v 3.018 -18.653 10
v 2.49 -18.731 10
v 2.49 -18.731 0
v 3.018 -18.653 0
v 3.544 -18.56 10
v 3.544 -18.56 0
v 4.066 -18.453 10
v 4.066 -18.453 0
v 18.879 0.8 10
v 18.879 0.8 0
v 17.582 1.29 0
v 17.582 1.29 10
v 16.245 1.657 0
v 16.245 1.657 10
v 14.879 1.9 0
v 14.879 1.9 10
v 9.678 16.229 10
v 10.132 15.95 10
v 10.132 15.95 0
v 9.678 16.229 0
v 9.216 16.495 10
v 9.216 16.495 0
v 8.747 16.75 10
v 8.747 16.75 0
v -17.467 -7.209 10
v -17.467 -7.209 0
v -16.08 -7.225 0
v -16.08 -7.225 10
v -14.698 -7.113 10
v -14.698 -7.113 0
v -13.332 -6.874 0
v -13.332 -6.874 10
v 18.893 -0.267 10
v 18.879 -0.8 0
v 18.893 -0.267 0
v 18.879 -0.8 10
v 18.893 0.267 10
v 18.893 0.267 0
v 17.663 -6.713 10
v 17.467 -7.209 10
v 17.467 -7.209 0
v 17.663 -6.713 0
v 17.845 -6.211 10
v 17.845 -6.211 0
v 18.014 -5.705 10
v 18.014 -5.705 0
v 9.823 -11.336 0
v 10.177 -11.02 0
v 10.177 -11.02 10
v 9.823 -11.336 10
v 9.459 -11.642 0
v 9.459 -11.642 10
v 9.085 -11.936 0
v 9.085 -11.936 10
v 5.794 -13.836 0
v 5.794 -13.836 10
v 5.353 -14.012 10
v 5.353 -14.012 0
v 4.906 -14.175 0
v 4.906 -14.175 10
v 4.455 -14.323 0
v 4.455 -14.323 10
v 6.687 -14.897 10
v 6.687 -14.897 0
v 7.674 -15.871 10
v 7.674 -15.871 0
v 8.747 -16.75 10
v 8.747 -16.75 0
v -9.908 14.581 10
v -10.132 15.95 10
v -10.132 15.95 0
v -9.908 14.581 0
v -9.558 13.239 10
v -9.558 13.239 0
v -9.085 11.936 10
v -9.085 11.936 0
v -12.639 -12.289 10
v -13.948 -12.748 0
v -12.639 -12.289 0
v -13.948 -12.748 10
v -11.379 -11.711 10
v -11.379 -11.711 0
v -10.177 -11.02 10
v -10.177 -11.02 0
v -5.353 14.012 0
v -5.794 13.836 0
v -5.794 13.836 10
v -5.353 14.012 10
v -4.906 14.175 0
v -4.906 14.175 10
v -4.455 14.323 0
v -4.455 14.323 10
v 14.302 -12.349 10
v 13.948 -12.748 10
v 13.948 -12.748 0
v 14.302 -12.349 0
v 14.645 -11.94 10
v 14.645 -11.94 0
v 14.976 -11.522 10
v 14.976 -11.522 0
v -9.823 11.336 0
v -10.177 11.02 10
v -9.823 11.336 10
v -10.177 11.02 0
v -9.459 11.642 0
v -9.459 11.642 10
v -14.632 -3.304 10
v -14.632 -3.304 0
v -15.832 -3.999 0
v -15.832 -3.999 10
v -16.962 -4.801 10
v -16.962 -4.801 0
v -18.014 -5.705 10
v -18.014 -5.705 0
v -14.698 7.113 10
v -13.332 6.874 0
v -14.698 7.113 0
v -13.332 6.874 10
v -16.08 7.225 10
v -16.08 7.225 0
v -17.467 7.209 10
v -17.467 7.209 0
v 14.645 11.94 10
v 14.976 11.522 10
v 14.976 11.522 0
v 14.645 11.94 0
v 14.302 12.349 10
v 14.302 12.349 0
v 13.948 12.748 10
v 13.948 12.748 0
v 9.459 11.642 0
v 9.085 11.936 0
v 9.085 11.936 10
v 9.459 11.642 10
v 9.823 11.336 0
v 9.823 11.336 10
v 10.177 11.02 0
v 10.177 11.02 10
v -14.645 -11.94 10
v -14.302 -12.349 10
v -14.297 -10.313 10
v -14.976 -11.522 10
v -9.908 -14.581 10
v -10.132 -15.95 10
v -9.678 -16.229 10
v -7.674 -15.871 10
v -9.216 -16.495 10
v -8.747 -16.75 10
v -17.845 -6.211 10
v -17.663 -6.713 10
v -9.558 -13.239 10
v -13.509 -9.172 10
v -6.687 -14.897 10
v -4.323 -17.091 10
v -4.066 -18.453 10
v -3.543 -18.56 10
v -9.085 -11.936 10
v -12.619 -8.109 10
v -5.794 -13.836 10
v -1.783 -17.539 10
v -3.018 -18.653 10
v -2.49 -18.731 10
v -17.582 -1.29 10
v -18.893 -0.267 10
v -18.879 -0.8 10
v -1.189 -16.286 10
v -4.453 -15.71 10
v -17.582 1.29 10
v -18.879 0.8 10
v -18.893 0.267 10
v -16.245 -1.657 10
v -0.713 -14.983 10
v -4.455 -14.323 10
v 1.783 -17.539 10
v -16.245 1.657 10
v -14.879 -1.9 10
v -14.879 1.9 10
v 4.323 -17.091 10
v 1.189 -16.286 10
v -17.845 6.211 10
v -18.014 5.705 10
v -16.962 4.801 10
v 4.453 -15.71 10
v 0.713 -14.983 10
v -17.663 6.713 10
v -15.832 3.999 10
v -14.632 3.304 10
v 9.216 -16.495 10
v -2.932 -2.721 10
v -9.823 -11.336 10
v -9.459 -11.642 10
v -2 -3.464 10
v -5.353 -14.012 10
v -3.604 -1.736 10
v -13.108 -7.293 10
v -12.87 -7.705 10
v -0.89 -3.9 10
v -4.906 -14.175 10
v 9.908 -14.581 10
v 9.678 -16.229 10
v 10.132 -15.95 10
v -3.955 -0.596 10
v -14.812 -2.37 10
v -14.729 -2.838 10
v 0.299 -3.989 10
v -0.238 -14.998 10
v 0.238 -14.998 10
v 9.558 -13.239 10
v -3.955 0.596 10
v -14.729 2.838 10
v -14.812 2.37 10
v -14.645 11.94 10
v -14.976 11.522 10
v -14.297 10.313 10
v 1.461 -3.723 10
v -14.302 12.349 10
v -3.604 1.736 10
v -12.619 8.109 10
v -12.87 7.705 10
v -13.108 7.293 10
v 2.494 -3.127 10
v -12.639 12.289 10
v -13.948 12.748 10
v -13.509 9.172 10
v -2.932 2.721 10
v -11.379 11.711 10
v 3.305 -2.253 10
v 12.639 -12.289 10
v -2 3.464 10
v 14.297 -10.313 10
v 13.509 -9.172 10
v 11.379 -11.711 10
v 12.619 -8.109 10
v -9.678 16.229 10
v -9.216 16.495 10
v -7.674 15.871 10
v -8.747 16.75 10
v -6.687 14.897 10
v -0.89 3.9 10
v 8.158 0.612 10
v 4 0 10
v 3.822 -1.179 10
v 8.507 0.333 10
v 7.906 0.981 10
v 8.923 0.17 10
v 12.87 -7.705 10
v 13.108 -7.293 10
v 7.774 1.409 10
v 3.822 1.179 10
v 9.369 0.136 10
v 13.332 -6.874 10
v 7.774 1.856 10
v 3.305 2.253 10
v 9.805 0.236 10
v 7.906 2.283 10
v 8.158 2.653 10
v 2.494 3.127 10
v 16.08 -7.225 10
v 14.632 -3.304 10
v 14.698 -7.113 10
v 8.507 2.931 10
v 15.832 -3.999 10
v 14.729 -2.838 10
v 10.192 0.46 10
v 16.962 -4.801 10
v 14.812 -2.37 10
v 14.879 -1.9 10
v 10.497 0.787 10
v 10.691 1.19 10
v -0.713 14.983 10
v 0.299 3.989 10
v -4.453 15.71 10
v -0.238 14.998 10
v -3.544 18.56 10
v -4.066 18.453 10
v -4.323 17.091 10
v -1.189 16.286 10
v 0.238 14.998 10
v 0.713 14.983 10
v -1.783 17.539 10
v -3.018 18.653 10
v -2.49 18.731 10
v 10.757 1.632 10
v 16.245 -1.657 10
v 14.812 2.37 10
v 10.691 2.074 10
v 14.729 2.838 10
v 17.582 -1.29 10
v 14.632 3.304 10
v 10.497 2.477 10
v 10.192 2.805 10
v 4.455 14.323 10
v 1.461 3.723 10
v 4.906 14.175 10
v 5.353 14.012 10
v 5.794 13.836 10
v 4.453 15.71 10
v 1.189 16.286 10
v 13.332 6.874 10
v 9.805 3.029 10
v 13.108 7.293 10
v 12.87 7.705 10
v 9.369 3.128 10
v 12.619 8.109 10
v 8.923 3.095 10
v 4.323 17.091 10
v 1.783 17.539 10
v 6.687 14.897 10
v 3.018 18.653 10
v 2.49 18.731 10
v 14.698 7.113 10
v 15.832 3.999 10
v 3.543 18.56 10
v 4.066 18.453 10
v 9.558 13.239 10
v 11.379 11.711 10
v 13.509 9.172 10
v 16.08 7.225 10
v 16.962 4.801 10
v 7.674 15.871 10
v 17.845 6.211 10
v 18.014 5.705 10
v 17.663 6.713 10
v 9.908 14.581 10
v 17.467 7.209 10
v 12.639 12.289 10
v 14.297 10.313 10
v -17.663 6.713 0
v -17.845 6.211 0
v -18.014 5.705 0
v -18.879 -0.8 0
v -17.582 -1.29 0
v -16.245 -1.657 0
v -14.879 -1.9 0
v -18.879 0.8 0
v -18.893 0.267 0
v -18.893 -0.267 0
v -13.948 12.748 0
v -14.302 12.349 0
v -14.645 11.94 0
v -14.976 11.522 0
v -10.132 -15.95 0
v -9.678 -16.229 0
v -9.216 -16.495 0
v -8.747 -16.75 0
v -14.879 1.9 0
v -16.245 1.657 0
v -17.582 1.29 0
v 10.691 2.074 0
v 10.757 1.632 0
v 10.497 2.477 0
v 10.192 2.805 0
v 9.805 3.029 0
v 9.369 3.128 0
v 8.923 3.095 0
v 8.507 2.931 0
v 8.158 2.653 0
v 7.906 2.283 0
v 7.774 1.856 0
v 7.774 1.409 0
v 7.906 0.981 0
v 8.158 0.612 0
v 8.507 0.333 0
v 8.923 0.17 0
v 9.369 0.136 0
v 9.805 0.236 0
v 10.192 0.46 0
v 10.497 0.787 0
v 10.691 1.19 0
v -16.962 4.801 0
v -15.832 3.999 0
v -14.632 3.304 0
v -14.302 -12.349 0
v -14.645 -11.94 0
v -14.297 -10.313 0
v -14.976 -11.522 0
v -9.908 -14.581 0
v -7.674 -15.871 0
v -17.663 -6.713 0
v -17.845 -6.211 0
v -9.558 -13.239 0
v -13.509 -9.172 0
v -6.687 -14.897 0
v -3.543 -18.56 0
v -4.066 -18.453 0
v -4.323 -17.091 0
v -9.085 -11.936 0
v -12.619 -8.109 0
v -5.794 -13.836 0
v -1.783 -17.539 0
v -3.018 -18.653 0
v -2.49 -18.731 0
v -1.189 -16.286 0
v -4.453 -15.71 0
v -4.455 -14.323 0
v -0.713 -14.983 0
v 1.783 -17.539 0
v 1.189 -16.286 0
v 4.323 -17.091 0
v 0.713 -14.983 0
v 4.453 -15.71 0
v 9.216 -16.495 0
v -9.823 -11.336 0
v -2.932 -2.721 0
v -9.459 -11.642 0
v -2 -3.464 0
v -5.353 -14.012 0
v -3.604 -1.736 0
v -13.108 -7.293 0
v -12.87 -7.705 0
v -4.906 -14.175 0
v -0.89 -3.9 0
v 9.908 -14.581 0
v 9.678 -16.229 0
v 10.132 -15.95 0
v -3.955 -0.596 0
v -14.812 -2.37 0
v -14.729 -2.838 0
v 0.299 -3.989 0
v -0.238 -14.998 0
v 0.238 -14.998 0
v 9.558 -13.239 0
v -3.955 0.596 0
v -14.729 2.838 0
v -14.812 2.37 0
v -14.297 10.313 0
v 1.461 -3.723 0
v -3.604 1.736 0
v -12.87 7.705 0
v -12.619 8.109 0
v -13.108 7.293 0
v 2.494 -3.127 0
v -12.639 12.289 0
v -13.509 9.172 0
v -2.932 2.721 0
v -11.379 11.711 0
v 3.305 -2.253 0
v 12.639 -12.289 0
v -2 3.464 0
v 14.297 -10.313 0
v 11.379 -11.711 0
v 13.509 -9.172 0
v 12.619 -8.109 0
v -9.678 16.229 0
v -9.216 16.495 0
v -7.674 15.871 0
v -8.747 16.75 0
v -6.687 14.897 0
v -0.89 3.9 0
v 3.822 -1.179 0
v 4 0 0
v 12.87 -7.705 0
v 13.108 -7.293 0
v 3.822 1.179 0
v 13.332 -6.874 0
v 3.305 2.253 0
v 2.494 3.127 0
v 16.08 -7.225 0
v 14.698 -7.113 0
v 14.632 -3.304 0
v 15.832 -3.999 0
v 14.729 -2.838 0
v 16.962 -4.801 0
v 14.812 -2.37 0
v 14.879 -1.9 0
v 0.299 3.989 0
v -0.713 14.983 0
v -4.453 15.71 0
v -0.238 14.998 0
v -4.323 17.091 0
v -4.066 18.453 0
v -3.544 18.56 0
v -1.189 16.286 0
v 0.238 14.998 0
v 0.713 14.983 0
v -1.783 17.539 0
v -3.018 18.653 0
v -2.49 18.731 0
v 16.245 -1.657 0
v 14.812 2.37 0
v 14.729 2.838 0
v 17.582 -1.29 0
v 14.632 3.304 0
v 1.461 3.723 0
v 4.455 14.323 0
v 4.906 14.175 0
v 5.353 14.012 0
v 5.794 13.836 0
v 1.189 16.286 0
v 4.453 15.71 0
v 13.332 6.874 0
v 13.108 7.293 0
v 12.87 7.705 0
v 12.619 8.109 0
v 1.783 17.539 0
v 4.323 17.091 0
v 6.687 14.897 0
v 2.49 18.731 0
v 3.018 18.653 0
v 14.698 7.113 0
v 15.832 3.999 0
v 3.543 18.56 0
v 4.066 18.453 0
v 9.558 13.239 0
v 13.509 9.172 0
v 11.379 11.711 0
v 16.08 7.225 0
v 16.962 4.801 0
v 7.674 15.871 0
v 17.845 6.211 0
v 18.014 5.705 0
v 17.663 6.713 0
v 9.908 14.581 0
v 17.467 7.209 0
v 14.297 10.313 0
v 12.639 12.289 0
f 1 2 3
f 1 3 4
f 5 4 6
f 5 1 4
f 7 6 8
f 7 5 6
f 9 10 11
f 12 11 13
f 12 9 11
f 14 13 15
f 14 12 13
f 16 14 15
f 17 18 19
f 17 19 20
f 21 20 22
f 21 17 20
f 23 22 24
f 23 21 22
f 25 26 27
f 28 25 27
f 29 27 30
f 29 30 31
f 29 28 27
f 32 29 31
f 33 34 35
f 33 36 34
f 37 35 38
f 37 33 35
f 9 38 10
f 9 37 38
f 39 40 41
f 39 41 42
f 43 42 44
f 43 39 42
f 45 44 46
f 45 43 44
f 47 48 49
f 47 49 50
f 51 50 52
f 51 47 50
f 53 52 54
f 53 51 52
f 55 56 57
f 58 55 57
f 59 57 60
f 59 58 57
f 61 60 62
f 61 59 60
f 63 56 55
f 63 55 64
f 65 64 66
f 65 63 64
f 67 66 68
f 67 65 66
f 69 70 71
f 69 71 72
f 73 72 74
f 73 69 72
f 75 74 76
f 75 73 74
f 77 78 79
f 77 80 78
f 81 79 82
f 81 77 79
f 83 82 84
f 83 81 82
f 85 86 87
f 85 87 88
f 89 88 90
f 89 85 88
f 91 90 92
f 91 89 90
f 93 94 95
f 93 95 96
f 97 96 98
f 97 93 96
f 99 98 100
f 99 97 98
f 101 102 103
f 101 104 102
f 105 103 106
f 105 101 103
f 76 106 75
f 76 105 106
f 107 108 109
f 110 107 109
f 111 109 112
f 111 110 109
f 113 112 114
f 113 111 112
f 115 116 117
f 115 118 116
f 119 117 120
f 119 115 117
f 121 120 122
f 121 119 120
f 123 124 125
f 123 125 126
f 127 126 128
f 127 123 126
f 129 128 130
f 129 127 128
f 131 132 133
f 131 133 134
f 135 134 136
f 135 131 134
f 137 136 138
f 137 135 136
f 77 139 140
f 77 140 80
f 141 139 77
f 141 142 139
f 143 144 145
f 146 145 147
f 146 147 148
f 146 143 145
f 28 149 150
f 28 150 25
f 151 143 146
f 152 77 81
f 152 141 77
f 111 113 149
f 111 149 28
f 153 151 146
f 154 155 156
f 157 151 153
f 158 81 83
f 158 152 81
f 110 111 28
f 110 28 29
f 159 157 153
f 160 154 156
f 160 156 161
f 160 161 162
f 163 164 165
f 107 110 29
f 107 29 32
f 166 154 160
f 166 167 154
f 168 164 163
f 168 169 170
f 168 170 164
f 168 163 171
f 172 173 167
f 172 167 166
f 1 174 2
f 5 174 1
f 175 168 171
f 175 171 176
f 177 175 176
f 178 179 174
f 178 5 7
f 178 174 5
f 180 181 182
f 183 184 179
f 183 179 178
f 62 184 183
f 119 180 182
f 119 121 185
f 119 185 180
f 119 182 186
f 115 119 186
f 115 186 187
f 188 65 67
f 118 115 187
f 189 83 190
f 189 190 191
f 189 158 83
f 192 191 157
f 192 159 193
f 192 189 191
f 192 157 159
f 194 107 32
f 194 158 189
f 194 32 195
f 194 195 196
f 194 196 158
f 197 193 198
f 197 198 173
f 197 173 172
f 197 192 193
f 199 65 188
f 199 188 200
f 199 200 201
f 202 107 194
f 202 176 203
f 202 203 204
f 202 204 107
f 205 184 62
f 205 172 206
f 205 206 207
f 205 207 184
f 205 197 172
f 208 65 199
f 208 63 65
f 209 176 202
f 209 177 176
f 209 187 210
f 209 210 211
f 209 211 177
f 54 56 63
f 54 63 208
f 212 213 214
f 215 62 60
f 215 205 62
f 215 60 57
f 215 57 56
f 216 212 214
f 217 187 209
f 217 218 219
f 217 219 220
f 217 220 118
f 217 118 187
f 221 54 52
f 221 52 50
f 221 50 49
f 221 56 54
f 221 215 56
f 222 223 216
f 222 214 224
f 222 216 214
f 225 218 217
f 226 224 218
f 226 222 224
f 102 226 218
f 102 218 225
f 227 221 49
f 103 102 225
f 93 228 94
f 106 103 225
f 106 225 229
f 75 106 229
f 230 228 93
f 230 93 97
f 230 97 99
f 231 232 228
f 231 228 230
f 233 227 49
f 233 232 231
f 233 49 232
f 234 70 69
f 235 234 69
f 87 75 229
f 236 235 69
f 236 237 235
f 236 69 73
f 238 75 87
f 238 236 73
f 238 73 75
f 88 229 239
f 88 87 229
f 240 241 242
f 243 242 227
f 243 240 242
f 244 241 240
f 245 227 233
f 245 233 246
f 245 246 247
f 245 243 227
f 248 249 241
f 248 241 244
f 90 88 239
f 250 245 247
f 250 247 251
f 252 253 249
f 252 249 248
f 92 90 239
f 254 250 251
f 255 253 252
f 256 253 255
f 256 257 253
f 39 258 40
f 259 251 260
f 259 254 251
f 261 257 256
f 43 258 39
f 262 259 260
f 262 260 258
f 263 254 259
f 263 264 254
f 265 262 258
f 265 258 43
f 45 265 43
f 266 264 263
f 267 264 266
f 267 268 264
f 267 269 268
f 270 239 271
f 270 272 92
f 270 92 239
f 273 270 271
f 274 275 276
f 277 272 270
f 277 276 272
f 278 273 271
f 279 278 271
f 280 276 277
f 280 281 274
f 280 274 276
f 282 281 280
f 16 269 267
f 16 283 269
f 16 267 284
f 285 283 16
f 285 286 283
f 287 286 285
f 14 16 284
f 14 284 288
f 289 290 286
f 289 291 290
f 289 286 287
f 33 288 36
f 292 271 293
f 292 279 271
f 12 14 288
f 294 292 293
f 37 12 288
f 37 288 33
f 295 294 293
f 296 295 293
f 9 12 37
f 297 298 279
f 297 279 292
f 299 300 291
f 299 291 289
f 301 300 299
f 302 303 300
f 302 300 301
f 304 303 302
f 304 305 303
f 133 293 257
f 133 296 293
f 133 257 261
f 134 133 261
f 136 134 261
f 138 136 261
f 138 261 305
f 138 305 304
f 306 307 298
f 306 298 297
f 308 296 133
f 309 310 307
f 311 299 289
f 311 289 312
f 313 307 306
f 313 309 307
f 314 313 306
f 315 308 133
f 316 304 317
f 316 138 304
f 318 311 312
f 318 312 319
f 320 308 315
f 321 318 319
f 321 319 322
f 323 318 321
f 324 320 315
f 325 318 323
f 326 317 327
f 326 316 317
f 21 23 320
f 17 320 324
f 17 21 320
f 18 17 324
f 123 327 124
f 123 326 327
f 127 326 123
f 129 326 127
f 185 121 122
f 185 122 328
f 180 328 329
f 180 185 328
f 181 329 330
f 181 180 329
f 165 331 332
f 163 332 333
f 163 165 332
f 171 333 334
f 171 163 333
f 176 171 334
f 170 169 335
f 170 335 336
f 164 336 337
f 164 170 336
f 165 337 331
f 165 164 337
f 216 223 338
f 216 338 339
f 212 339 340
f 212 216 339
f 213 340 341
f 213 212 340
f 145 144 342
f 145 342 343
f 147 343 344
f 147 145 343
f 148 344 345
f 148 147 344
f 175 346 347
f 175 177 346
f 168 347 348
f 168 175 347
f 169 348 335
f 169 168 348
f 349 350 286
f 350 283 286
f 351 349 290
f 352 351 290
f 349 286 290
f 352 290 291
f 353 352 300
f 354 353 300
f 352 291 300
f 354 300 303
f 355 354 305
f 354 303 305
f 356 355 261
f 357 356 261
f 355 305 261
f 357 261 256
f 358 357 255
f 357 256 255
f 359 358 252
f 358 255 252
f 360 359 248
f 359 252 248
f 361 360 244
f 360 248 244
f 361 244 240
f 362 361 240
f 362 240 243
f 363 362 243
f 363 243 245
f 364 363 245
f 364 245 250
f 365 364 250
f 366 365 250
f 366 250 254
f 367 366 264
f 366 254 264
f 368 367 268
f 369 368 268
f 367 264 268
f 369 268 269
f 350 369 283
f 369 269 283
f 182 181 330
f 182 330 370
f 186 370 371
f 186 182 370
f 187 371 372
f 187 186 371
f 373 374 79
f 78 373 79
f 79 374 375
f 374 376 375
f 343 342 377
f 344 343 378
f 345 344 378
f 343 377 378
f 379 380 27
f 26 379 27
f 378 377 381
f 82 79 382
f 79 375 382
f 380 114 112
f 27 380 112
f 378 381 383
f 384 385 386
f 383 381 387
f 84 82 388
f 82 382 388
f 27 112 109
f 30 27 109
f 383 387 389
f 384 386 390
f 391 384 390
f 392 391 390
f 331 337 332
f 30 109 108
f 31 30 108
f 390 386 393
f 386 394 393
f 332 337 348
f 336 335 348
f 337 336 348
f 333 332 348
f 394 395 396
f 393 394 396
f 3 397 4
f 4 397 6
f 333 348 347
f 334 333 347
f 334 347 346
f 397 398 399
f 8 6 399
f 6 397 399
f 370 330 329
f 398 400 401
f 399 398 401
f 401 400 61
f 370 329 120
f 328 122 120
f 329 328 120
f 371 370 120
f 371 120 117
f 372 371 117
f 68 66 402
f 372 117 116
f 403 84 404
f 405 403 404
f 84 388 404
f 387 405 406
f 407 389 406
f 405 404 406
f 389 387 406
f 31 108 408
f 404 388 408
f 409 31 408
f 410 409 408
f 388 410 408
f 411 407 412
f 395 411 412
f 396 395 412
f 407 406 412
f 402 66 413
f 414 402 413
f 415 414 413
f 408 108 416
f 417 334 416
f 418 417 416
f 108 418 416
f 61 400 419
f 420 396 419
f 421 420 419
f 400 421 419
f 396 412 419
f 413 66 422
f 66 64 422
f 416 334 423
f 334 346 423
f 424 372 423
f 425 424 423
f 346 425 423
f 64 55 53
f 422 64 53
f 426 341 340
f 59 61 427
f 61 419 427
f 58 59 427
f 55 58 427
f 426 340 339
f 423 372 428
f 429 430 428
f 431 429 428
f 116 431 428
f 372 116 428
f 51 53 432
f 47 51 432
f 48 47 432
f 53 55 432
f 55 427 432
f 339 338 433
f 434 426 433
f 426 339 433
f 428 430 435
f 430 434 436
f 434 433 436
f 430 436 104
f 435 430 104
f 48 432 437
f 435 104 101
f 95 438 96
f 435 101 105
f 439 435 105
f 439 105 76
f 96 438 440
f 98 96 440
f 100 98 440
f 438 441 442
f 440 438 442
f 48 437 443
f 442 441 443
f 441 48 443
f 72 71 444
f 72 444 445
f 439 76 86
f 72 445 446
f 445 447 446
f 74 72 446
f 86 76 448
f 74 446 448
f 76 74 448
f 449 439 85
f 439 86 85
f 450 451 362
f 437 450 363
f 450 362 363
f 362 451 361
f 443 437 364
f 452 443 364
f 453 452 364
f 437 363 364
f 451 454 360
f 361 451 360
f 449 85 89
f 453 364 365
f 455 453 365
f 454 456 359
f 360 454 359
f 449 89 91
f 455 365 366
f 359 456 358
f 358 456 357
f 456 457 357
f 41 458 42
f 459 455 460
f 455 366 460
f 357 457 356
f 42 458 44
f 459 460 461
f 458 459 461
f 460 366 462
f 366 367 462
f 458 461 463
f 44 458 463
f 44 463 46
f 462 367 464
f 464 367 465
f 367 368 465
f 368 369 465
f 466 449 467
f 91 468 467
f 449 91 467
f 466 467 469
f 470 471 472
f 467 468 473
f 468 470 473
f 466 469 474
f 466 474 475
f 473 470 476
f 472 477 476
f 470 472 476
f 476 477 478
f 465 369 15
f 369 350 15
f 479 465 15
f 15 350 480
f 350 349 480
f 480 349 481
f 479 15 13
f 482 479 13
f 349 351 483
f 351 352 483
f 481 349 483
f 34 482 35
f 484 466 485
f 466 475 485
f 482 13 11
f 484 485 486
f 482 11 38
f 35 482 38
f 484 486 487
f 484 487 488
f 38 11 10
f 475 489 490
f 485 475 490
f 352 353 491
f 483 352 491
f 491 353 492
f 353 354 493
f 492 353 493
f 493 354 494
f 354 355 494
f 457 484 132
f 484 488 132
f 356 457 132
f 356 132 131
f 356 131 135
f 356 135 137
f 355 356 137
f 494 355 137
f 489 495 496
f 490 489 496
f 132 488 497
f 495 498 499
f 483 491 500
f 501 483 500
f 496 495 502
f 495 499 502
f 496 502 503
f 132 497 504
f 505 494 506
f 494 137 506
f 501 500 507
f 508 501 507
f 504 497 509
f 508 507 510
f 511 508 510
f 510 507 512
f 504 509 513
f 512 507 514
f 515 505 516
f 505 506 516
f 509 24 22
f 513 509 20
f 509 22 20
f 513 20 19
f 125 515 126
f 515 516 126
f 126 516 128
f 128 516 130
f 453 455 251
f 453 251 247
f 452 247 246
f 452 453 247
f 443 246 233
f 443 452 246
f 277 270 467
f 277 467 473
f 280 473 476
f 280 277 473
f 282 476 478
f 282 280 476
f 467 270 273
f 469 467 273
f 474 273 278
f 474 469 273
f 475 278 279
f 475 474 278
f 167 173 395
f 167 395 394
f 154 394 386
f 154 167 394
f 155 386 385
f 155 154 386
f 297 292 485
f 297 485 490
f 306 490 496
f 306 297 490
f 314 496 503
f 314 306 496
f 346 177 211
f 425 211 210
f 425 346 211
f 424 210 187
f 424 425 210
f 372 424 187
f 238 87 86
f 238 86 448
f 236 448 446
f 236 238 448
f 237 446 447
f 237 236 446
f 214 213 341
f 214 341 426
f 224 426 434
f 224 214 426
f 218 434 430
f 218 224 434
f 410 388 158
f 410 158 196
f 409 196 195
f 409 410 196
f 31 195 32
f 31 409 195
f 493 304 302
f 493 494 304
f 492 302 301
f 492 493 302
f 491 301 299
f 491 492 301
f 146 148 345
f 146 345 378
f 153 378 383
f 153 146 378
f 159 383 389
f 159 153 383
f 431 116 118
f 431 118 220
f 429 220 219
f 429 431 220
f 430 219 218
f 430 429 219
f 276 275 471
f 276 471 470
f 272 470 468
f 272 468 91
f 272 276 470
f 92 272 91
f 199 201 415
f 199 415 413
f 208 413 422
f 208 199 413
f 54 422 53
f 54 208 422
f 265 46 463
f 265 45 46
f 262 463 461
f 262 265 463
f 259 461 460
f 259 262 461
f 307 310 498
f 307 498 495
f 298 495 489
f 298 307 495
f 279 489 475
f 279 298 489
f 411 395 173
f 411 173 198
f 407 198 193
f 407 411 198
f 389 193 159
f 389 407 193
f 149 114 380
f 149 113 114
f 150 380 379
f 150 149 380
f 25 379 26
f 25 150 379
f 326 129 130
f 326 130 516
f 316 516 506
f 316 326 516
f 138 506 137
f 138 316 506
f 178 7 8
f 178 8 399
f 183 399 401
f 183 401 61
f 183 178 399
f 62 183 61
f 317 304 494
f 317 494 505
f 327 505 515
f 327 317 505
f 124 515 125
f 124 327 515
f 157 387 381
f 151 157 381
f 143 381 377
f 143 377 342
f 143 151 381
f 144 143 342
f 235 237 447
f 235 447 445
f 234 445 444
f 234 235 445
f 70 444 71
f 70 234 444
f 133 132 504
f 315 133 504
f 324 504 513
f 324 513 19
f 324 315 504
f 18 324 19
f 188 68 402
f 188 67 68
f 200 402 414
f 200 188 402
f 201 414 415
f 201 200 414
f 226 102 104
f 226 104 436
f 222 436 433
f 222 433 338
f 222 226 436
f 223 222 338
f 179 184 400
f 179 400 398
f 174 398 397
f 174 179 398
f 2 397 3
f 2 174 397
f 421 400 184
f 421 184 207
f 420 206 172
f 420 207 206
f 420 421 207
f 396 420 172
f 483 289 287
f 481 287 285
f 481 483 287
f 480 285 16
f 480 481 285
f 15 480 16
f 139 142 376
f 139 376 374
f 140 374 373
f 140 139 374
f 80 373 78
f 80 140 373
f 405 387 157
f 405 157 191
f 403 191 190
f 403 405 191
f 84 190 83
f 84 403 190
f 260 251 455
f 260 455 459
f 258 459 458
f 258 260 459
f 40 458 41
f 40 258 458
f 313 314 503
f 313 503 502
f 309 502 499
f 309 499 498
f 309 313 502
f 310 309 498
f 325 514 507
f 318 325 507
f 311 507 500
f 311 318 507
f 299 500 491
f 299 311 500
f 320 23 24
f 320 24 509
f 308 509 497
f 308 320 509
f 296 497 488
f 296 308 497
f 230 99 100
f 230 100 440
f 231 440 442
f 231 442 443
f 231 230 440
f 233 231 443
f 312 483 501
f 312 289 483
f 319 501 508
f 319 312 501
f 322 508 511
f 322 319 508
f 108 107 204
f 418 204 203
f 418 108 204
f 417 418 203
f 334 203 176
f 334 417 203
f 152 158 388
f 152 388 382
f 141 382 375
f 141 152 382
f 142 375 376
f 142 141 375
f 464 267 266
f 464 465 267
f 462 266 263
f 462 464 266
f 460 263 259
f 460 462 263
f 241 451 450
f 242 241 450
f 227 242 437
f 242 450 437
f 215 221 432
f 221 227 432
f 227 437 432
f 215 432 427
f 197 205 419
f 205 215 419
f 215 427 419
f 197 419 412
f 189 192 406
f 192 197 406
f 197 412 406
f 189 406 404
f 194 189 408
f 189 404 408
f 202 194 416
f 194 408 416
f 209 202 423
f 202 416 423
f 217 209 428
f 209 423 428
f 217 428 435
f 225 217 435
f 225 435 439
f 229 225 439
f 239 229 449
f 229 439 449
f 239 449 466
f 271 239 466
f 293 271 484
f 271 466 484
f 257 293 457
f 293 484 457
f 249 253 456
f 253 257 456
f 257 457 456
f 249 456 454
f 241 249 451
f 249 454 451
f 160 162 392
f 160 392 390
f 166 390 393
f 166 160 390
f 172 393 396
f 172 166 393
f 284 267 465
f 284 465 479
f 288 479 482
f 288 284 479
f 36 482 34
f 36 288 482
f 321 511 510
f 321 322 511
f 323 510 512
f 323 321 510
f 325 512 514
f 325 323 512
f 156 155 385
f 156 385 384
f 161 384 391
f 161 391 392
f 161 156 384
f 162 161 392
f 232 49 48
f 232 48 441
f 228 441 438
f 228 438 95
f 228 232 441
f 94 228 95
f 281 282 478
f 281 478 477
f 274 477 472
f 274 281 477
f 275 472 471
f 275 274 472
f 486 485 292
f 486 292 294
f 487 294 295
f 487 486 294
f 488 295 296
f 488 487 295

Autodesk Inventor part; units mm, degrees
ref_plane "YZ Plane" through (0, 0, 0) normal (1, 0, 0) x (0, 1, 0)
ref_plane "XZ Plane" through (0, 0, 0) normal (0, 1, 0) x (-1, 0, 0)
ref_plane "XY Plane" through (0, 0, 0) normal (0, 0, 1) x (1, 0, 0)
sketch "Sketch1" plane through (0, 0, 0) normal (0, 0, 1) x (1, 0, 0)
  circle A0 centre (0, 0) radius 15
  circle A1 centre (0, 0) radius 4
  dimension "d0" = 30
  dimension "d1" = 8
extrude "Extrusion1" add sketch "Sketch1" along normal blind 10
sketch "Sketch3" plane through (0, 0, 10) normal (0, 0, 1) x (1, 0, 0)
  line L0 (0, 0) -> (25, 0) construction
  arc A0 (18.8792, 0.8) -> (14.8792, 1.9) centre (12.94, -12.9741) ccw
  circle A1 centre (0, 0) radius 15 projected
  arc A2 (18.8792, -0.8) -> (18.8792, 0.8) centre (-1.1048, 0) ccw
  arc A3 (14.8792, -1.9) -> (18.8792, -0.8) centre (12.94, 12.9741) ccw
  arc A4 (14.8792, -1.9) -> (14.8792, 1.9) centre (0, 0) ccw
  arc A5 (17.467, 7.2088) -> (13.332, 6.8744) centre (16.5971, -7.7659) ccw
  arc A6 (18.0142, 5.7053) -> (17.467, 7.2088) centre (-1.0382, -0.3779) ccw
  arc A7 (14.6317, 3.3036) -> (18.0142, 5.7053) centre (7.7223, 16.6175) ccw
  arc A8 (14.6317, 3.3036) -> (13.332, 6.8744) centre (0, 0) ccw
  arc A9 (13.9481, 12.7481) -> (10.1768, 11.0196) centre (18.2523, -1.6211) ccw
  arc A10 (14.9765, 11.5225) -> (13.9481, 12.7481) centre (-0.8463, -0.7102) ccw
  arc A11 (12.6194, 8.1087) -> (14.9765, 11.5225) centre (1.573, 18.2565) ccw
  arc A12 (12.6194, 8.1087) -> (10.1768, 11.0196) centre (0, 0) ccw
  arc A13 (8.7468, 16.7498) -> (5.7941, 13.8357) centre (17.7059, 4.7193) ccw
  arc A14 (10.1324, 15.9498) -> (8.7468, 16.7498) centre (-0.5524, -0.9568) ccw
  arc A15 (9.085, 11.9357) -> (10.1324, 15.9498) centre (-4.7659, 17.6935) ccw
  arc A16 (9.085, 11.9357) -> (5.7941, 13.8357) centre (0, 0) ccw
  arc A17 (2.4905, 18.7313) -> (0.7126, 14.9831) centre (15.024, 10.4905) ccw
  arc A18 (4.0662, 18.4534) -> (2.4905, 18.7313) centre (-0.1918, -1.088) ccw
  arc A19 (4.4549, 14.3232) -> (4.0662, 18.4534) centre (-10.53, 14.9964) ccw
  arc A20 (4.4549, 14.3232) -> (0.7126, 14.9831) centre (0, 0) ccw
  arc A21 (-4.0662, 18.4534) -> (-4.4549, 14.3232) centre (10.53, 14.9964) ccw
  arc A22 (-2.4905, 18.7313) -> (-4.0662, 18.4534) centre (0.1918, -1.088) ccw
  arc A23 (-0.7126, 14.9831) -> (-2.4905, 18.7313) centre (-15.024, 10.4905) ccw
  arc A24 (-0.7126, 14.9831) -> (-4.4549, 14.3232) centre (0, 0) ccw
  arc A25 (-10.1324, 15.9498) -> (-9.085, 11.9357) centre (4.7659, 17.6935) ccw
  arc A26 (-8.7468, 16.7498) -> (-10.1324, 15.9498) centre (0.5524, -0.9568) ccw
  arc A27 (-5.7941, 13.8357) -> (-8.7468, 16.7498) centre (-17.7059, 4.7193) ccw
  arc A28 (-5.7941, 13.8357) -> (-9.085, 11.9357) centre (0, 0) ccw
  arc A29 (-14.9765, 11.5225) -> (-12.6194, 8.1087) centre (-1.573, 18.2565) ccw
  arc A30 (-13.9481, 12.7481) -> (-14.9765, 11.5225) centre (0.8463, -0.7102) ccw
  arc A31 (-10.1768, 11.0196) -> (-13.9481, 12.7481) centre (-18.2523, -1.6211) ccw
  arc A32 (-10.1768, 11.0196) -> (-12.6194, 8.1087) centre (0, 0) ccw
  arc A33 (-18.0142, 5.7053) -> (-14.6317, 3.3036) centre (-7.7223, 16.6175) ccw
  arc A34 (-17.467, 7.2088) -> (-18.0142, 5.7053) centre (1.0382, -0.3779) ccw
  arc A35 (-13.332, 6.8744) -> (-17.467, 7.2088) centre (-16.5971, -7.7659) ccw
  arc A36 (-13.332, 6.8744) -> (-14.6317, 3.3036) centre (0, 0) ccw
  arc A37 (-18.8792, -0.8) -> (-14.8792, -1.9) centre (-12.94, 12.9741) ccw
  arc A38 (-18.8792, 0.8) -> (-18.8792, -0.8) centre (1.1048, 0) ccw
  arc A39 (-14.8792, 1.9) -> (-18.8792, 0.8) centre (-12.94, -12.9741) ccw
  arc A40 (-14.8792, 1.9) -> (-14.8792, -1.9) centre (0, 0) ccw
  arc A41 (-17.467, -7.2088) -> (-13.332, -6.8744) centre (-16.5971, 7.7659) ccw
  arc A42 (-18.0142, -5.7053) -> (-17.467, -7.2088) centre (1.0382, 0.3779) ccw
  arc A43 (-14.6317, -3.3036) -> (-18.0142, -5.7053) centre (-7.7223, -16.6175) ccw
  arc A44 (-14.6317, -3.3036) -> (-13.332, -6.8744) centre (0, 0) ccw
  arc A45 (-13.9481, -12.7481) -> (-10.1768, -11.0196) centre (-18.2523, 1.6211) ccw
  arc A46 (-14.9765, -11.5225) -> (-13.9481, -12.7481) centre (0.8463, 0.7102) ccw
  arc A47 (-12.6194, -8.1087) -> (-14.9765, -11.5225) centre (-1.573, -18.2565) ccw
  arc A48 (-12.6194, -8.1087) -> (-10.1768, -11.0196) centre (0, 0) ccw
  arc A49 (-8.7468, -16.7498) -> (-5.7941, -13.8357) centre (-17.7059, -4.7193) ccw
  arc A50 (-10.1324, -15.9498) -> (-8.7468, -16.7498) centre (0.5524, 0.9568) ccw
  arc A51 (-9.085, -11.9357) -> (-10.1324, -15.9498) centre (4.7659, -17.6935) ccw
  arc A52 (-9.085, -11.9357) -> (-5.7941, -13.8357) centre (0, 0) ccw
  arc A53 (-2.4905, -18.7313) -> (-0.7126, -14.9831) centre (-15.024, -10.4905) ccw
  arc A54 (-4.0662, -18.4534) -> (-2.4905, -18.7313) centre (0.1918, 1.088) ccw
  arc A55 (-4.4549, -14.3232) -> (-4.0662, -18.4534) centre (10.53, -14.9964) ccw
  arc A56 (-4.4549, -14.3232) -> (-0.7126, -14.9831) centre (0, 0) ccw
  arc A57 (4.0662, -18.4534) -> (4.4549, -14.3232) centre (-10.53, -14.9964) ccw
  arc A58 (2.4905, -18.7313) -> (4.0662, -18.4534) centre (-0.1918, 1.088) ccw
  arc A59 (0.7126, -14.9831) -> (2.4905, -18.7313) centre (15.024, -10.4905) ccw
  arc A60 (0.7126, -14.9831) -> (4.4549, -14.3232) centre (0, 0) ccw
  arc A61 (10.1324, -15.9498) -> (9.085, -11.9357) centre (-4.7659, -17.6935) ccw
  arc A62 (8.7468, -16.7498) -> (10.1324, -15.9498) centre (-0.5524, 0.9568) ccw
  arc A63 (5.7941, -13.8357) -> (8.7468, -16.7498) centre (17.7059, -4.7193) ccw
  arc A64 (5.7941, -13.8357) -> (9.085, -11.9357) centre (0, 0) ccw
  arc A65 (14.9765, -11.5225) -> (12.6194, -8.1087) centre (1.573, -18.2565) ccw
  arc A66 (13.9481, -12.7481) -> (14.9765, -11.5225) centre (-0.8463, 0.7102) ccw
  arc A67 (10.1768, -11.0196) -> (13.9481, -12.7481) centre (18.2523, 1.6211) ccw
  arc A68 (10.1768, -11.0196) -> (12.6194, -8.1087) centre (0, 0) ccw
  arc A69 (18.0142, -5.7053) -> (14.6317, -3.3036) centre (7.7223, -16.6175) ccw
  arc A70 (17.467, -7.2088) -> (18.0142, -5.7053) centre (-1.0382, 0.3779) ccw
  arc A71 (13.332, -6.8744) -> (17.467, -7.2088) centre (16.5971, 7.7659) ccw
  arc A72 (13.332, -6.8744) -> (14.6317, -3.3036) centre (0, 0) ccw
  point P0 (18.8952, 0)
  point P1 (17.7557, 6.4625)
  point P2 (14.4746, 12.1456)
  point P3 (9.4476, 16.3637)
  point P4 (3.2811, 18.6081)
  point P5 (-3.2811, 18.6081)
  point P6 (-9.4476, 16.3637)
  point P7 (-14.4746, 12.1456)
  point P8 (-17.7557, 6.4625)
  point P9 (-18.8952, 0)
  point P10 (-17.7557, -6.4625)
  point P11 (-14.4746, -12.1456)
  point P12 (-9.4476, -16.3637)
  point P13 (-3.2811, -18.6081)
  point P14 (3.2811, -18.6081)
  point P15 (9.4476, -16.3637)
  point P16 (14.4746, -12.1456)
  point P17 (17.7557, -6.4625)
  dimension "d8" = 25
  dimension "d9" = 15
  dimension "d10" = 1.6
  dimension "d11" = 20
  dimension "d12" = 4
  dimension "d13" = 1.1
  dimension "d14" = 15
  dimension "d15" = 1.1
  dimension "d16" = 4
  dimension "d19" = 360
extrude "Extrusion3" add sketch "Sketch3" against normal blind 10 contours A2 A3 A1 A0 | A1 A5 A6 A7 | A69 A70 A71 A1 | A1 A9 A10 A11 | A65 A66 A67 A1 | A1 A13 A14 A15 | A61 A62 A63 A1 | A1 A17 A18 A19 | A57 A58 A59 A1 | A1 A21 A22 A23 | A53 A54 A55 A1 | A1 A25 A26 A27 | A49 A50 A51 A1 | A1 A29 A30 A31 | A45 A46 A47 A1 | A1 A33 A34 A35 | A41 A42 A43 A1 | A1 A37 A38 A39
sketch "Sketch2" plane through (0, 0, 10) normal (0, 0, 1) x (1, 0, 0)
  circle A0 centre (9.2572, 1.6323) radius 1.5
  circle A1 centre (0, 0) radius 15 construction
  circle A2 centre (0, 0) radius 4 construction
  circle A3 centre (0, 0) radius 4 construction
  circle A4 centre (0, 0) radius 15 construction
  arc A5 (14.8792, 1.9) -> (14.6317, 3.3036) centre (0, 0) ccw
  line L0 (0, 0) -> (3.9392, 0.6946) construction
  line L1 (0, 0) -> (14.7721, 2.6047) construction
  dimension "d4" = 3
  dimension "d24" = 9.4
extrude "Extrusion2" cut sketch "Sketch2" against normal through all
properties part number "GA002" material "ABS Plastic"
